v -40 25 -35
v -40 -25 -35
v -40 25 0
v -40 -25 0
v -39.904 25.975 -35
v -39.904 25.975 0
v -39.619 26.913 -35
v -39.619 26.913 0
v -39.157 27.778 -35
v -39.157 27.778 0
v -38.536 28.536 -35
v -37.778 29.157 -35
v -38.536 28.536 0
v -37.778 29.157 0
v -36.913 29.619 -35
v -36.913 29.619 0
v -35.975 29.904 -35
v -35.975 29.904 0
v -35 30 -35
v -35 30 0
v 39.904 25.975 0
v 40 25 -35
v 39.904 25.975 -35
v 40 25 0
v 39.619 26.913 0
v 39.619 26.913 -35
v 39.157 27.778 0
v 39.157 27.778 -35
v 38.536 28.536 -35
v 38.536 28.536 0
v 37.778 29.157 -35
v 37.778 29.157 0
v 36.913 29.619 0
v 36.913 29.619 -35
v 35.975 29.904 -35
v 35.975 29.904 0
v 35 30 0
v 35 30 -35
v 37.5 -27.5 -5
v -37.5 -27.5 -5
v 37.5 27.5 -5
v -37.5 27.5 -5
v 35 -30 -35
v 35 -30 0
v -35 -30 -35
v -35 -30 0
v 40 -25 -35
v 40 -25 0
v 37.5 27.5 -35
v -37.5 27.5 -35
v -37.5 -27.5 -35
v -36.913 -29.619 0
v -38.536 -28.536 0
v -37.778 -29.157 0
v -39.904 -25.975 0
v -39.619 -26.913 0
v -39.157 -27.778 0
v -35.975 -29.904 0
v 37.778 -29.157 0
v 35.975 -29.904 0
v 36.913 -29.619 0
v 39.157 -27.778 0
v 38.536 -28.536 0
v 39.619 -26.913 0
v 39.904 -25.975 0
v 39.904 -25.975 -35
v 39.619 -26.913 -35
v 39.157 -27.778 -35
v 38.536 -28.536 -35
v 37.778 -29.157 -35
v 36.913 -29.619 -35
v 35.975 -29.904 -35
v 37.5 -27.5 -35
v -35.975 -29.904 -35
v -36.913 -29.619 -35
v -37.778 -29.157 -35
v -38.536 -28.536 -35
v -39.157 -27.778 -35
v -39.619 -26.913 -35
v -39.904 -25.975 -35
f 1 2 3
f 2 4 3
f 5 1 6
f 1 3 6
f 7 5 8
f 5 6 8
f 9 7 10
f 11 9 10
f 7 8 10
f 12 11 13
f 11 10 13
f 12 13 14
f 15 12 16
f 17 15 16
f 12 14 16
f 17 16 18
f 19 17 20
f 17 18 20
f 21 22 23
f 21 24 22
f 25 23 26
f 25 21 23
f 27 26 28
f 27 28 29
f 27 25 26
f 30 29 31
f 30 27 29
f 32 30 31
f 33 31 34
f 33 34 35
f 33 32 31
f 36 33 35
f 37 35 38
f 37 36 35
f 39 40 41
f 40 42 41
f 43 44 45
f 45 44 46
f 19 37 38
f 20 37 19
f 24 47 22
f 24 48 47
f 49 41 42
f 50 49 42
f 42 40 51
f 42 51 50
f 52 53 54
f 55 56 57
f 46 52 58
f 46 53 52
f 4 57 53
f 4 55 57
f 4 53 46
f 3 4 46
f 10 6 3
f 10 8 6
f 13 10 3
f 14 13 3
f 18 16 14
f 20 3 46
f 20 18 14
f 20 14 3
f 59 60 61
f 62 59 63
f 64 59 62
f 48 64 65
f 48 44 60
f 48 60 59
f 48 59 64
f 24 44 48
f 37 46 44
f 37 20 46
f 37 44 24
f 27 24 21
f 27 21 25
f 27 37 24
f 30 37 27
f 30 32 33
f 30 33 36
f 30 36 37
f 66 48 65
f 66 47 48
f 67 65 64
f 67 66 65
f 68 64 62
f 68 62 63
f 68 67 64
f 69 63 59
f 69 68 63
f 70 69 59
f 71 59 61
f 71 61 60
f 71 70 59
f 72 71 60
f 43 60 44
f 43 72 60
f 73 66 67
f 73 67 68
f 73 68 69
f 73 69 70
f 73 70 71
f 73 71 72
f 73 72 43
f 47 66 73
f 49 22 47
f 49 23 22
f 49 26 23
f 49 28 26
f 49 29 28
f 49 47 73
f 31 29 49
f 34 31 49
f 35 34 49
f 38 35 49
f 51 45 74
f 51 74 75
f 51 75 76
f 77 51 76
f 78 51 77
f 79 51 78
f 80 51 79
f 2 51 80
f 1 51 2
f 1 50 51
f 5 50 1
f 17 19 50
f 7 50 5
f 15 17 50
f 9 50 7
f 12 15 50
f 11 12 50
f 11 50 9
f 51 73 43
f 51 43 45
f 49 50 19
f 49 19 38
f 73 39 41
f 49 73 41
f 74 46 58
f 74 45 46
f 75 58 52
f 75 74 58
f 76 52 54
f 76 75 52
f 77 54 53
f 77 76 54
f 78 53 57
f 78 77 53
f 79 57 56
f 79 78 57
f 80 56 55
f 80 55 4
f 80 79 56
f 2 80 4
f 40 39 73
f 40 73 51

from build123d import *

# Parameters (mm, degrees)
SKETCH1_W           = 80
SKETCH1_H           = 60
BOSS_EXTRUDE5_DEPTH = 5
SKETCH4_W           = 80
SKETCH4_H           = 60
SKETCH4_W_2         = 75
SKETCH4_H_2         = 55
BOSS_EXTRUDE6_DEPTH = 30
FILLET2_R           = 5


with BuildPart() as part:
    # Sketch1 → Boss-Extrude5 (new body)
    with BuildSketch(Plane.XY):
        Rectangle(SKETCH1_W, SKETCH1_H)
    extrude(amount=-BOSS_EXTRUDE5_DEPTH)

    # Sketch4 → Boss-Extrude6 (add)
    with BuildSketch(Plane(origin=(0, 0, -5), x_dir=(-1, 0, 0), z_dir=(0, 0, -1))):
        Rectangle(SKETCH4_W, SKETCH4_H)
        Rectangle(SKETCH4_W_2, SKETCH4_H_2, mode=Mode.SUBTRACT)
    extrude(amount=BOSS_EXTRUDE6_DEPTH)

    # Fillet2
    fillet2_edges = [part.edges().sort_by_distance(p)[0] for p in [
        (40, -30, -17.5),
        (-40, -30, -17.5),
        (-40, 30, -17.5),
        (40, 30, -17.5),
    ]]
    fillet(fillet2_edges, radius=FILLET2_R)


solid = part.part
